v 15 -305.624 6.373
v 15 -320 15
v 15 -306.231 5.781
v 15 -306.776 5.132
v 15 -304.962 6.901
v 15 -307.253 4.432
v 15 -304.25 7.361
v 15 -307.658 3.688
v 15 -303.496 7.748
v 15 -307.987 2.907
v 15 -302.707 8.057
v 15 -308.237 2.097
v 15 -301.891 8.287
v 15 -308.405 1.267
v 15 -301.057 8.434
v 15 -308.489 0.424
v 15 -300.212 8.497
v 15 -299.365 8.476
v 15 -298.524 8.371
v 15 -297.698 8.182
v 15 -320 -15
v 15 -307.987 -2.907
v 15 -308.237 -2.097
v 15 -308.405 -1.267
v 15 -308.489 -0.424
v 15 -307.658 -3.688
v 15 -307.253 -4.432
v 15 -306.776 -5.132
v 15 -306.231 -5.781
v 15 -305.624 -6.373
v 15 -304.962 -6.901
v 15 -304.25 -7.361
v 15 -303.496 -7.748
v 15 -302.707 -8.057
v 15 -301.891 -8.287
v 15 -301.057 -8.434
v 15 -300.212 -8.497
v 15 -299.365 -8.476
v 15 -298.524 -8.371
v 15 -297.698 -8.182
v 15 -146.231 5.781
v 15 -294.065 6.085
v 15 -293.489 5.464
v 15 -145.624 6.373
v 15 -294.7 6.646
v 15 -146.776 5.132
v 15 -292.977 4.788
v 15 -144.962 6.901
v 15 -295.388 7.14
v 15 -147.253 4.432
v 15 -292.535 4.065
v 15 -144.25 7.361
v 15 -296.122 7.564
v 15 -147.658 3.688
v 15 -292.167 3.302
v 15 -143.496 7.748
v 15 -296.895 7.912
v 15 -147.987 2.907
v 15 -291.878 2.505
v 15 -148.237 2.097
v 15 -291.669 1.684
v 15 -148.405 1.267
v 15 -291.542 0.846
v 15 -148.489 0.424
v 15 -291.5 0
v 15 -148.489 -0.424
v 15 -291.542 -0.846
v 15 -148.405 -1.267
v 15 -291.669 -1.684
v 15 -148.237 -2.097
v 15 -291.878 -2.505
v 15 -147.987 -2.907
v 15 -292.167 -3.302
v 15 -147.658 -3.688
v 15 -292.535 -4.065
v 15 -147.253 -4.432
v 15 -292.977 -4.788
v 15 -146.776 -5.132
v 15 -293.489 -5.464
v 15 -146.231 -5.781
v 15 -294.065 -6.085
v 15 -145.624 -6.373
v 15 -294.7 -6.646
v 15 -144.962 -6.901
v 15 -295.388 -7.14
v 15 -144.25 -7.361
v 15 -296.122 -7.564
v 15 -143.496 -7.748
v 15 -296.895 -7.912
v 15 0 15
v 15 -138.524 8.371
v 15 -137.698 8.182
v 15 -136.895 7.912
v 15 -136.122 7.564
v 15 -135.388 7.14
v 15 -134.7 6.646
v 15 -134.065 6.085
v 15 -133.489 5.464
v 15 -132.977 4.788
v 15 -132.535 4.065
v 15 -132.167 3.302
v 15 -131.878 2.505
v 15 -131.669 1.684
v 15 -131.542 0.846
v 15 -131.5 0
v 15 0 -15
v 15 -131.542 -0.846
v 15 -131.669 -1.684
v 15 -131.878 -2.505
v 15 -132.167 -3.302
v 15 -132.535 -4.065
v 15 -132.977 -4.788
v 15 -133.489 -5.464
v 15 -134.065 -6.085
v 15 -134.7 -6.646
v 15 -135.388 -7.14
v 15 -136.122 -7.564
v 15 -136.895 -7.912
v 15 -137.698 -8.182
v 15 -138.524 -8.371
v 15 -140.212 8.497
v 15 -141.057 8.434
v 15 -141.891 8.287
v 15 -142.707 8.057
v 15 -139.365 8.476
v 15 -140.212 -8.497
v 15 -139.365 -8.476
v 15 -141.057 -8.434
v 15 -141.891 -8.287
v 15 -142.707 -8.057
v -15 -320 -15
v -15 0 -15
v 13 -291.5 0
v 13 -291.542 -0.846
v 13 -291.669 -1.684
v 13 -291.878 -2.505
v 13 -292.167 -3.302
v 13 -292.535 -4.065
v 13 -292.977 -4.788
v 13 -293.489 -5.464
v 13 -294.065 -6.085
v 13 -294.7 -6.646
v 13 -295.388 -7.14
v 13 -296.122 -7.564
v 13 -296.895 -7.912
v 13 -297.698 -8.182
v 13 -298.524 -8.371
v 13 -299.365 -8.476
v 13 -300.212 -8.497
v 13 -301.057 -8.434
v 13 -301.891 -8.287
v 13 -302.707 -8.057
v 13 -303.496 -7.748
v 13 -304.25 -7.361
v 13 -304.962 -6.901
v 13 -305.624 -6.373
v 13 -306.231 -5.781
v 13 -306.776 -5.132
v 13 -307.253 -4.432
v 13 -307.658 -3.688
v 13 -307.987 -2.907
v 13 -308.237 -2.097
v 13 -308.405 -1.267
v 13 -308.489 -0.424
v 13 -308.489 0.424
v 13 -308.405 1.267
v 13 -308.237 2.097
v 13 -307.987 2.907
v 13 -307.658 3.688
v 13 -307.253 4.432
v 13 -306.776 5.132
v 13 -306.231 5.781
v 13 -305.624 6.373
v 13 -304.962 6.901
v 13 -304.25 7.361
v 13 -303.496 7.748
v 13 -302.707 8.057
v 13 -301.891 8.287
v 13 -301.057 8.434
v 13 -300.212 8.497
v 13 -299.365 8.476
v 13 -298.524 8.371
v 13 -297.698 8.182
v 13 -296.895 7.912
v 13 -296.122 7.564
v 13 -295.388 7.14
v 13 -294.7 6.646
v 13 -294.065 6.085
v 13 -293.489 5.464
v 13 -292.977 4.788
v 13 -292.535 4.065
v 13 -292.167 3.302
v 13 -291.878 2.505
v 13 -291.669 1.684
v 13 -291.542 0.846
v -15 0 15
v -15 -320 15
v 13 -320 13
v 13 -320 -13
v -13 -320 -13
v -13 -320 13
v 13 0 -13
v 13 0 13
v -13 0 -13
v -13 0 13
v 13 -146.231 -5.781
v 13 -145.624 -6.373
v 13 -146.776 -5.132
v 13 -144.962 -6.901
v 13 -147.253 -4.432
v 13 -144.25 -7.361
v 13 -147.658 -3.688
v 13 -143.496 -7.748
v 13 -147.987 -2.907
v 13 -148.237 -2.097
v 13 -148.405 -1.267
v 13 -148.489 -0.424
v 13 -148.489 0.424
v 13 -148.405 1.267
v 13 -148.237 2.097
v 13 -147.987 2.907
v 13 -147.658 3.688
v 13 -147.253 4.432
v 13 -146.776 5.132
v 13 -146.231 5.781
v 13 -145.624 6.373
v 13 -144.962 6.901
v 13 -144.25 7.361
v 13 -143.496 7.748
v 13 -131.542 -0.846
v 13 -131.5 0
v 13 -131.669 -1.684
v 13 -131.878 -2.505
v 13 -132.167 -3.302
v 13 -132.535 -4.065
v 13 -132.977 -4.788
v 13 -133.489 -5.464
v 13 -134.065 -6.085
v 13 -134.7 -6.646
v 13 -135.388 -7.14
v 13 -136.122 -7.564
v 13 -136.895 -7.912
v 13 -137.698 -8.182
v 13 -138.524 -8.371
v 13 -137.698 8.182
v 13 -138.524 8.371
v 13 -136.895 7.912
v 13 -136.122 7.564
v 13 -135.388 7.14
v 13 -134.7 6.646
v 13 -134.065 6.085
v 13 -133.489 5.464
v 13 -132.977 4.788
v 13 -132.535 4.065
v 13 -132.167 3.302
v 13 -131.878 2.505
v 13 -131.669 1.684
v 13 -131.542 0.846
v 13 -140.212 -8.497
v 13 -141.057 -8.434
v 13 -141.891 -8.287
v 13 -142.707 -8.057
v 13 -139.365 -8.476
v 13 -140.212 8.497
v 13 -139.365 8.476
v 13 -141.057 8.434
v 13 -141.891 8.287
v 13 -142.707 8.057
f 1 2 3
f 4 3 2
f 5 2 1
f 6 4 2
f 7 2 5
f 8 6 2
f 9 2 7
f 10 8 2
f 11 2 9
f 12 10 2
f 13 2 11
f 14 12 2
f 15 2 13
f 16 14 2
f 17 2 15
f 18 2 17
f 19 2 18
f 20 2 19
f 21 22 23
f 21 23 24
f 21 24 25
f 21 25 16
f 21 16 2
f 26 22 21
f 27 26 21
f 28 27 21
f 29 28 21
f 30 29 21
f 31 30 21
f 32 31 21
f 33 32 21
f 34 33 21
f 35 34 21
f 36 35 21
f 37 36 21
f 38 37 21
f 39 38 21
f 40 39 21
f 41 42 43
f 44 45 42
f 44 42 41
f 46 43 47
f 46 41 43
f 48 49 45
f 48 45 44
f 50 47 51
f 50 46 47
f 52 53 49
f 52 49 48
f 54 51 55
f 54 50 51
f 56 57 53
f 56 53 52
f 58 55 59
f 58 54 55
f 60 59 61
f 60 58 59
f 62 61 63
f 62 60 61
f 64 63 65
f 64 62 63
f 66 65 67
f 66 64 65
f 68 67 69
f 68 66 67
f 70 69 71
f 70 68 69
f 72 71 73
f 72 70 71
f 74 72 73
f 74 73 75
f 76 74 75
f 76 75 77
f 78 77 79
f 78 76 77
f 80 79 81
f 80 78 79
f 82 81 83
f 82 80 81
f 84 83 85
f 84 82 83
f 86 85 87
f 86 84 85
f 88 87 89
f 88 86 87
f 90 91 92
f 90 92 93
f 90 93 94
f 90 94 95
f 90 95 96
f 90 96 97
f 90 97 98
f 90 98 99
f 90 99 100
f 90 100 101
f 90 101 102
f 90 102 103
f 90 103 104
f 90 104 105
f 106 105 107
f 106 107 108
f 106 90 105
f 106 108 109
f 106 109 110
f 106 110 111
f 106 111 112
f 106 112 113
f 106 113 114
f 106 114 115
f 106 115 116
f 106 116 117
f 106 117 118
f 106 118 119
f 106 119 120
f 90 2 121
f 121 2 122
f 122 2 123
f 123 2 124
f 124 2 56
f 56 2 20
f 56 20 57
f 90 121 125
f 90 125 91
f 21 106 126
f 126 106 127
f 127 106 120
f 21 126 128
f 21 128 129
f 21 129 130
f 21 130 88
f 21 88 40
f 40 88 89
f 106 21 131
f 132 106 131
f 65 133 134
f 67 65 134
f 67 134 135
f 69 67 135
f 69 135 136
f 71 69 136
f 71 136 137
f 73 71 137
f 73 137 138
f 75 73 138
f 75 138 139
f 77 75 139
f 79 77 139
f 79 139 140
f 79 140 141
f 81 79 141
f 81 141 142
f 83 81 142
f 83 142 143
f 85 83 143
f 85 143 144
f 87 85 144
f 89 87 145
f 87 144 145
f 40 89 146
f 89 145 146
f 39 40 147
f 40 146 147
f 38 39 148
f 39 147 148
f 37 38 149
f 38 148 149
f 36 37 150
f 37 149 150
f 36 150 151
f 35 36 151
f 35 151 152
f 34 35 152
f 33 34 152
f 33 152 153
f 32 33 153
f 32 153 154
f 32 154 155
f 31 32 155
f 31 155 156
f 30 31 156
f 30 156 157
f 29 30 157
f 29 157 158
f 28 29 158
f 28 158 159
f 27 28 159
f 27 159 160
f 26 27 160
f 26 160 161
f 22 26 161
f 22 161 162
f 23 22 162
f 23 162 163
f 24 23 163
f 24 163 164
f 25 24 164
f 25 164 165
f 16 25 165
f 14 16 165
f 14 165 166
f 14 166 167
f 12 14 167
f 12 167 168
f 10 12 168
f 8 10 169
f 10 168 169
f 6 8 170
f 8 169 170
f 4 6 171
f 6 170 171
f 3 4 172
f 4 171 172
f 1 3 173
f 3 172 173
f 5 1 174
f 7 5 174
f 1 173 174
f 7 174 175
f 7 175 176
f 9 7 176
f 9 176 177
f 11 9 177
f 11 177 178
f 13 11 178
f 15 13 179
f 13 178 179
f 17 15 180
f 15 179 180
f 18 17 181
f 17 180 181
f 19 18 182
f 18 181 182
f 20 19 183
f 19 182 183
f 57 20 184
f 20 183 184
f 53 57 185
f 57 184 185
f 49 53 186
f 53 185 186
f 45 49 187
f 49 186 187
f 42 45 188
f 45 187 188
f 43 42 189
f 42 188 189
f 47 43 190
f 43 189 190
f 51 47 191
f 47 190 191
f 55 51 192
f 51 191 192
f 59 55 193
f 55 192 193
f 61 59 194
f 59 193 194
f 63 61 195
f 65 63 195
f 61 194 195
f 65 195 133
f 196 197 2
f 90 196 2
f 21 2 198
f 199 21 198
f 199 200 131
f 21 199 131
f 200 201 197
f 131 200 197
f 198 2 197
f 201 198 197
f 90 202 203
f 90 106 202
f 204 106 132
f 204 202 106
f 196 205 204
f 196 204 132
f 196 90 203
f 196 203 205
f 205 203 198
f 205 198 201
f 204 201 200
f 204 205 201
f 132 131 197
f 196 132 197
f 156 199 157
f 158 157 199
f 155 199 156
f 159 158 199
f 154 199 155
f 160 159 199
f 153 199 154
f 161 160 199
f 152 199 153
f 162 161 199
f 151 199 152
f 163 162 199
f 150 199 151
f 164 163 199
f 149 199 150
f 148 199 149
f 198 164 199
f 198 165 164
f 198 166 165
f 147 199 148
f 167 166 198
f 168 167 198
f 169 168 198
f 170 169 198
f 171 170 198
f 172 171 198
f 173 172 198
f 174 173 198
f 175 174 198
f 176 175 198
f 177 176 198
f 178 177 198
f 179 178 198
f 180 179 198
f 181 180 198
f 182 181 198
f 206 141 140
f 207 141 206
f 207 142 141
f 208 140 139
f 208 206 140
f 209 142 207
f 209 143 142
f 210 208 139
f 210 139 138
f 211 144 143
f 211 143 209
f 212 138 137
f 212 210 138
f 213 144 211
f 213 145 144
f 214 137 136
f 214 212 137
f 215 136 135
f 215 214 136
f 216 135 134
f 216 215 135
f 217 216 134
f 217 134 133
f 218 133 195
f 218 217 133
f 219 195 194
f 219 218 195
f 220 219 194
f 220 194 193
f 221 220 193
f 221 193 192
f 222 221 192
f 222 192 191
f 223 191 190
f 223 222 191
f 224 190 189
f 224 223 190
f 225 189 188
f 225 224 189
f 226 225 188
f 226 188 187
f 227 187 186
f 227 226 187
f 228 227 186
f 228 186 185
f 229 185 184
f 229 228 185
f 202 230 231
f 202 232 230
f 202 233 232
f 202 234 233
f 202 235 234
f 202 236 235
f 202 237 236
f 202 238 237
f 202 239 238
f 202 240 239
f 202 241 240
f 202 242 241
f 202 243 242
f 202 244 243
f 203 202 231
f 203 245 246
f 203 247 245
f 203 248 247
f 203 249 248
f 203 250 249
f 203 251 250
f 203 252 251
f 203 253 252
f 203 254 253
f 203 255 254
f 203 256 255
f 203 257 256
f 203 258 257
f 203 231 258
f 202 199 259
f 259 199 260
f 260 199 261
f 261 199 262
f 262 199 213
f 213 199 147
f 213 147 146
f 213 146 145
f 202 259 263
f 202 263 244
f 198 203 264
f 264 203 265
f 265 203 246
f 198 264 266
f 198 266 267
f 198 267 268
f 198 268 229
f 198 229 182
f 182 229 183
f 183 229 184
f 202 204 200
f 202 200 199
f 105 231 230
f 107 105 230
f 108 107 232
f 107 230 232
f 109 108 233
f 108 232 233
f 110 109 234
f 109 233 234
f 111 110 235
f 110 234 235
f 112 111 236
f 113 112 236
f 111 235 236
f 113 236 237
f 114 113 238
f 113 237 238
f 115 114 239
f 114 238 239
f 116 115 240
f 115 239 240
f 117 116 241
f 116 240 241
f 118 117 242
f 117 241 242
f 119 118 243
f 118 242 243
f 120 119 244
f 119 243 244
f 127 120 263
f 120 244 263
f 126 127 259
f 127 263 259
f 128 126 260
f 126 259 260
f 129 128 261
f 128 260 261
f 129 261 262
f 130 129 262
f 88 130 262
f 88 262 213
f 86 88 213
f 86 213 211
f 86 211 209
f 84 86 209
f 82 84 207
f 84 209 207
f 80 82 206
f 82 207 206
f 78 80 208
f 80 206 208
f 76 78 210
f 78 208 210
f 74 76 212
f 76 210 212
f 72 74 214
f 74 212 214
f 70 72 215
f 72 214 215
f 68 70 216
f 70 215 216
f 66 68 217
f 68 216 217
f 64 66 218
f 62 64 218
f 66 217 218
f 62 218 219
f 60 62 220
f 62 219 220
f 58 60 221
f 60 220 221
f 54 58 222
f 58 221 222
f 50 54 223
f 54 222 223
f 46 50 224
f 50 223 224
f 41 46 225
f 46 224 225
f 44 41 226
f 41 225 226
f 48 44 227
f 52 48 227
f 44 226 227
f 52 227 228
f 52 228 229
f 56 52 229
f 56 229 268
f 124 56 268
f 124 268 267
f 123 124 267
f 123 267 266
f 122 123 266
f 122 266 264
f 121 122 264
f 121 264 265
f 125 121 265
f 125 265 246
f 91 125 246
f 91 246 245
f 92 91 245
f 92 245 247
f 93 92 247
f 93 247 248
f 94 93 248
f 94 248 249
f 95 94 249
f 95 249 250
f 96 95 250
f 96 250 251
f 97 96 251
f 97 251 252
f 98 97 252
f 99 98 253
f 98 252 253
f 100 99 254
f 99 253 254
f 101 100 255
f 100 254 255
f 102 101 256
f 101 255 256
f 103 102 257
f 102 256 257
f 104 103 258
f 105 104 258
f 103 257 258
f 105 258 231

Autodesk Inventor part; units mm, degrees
ref_plane "YZ Plane" through (0, 0, 0) normal (1, 0, 0) x (0, 1, 0)
ref_plane "XZ Plane" through (0, 0, 0) normal (0, 1, 0) x (-1, 0, 0)
ref_plane "XY Plane" through (0, 0, 0) normal (0, 0, 1) x (1, 0, 0)
sketch "Sketch9" plane through (0, 0, 0) normal (0, 1, 0) x (-1, 0, 0)
  line L0 (15, 15) -> (-15, 15)
  line L1 (-15, 15) -> (-15, -15)
  line L2 (-15, -15) -> (15, -15)
  line L3 (15, -15) -> (15, 15)
  line L4 (15, 15) -> (-15, -15) construction
  line L5 (-15, 15) -> (15, -15) construction
  line L6 (-13, 13) -> (13, 13)
  line L7 (13, 13) -> (13, -13)
  line L8 (13, -13) -> (-13, -13)
  line L9 (-13, -13) -> (-13, 13)
  point P0 (0, 0)
  dimension "d172" = 30
  dimension "d173" = 30
  dimension "d174" = 2
extrude "Extrusion3" add sketch "Sketch9" against normal blind 320
sketch "Sketch10" plane through (0, 0, 0) normal (1, 0, 0) x (0, 1, 0)
  line L0 (0, 15) -> (0, -15) construction
  line L1 (0, 15) -> (-320, 15) construction
  line L2 (-320, -15) -> (-320, 15) construction
  line L3 (0, -15) -> (-320, -15) construction
  line L4 (-148.5, 8.5) -> (-131.5, 8.5)
  line L5 (-131.5, 8.5) -> (-131.5, -8.5)
  line L6 (-131.5, -8.5) -> (-148.5, -8.5)
  line L7 (-148.5, -8.5) -> (-148.5, 8.5)
  line L8 (-148.5, 8.5) -> (-131.5, -8.5) construction
  line L9 (-131.5, 8.5) -> (-148.5, -8.5) construction
  line L10 (-308.5, 8.5) -> (-291.5, 8.5)
  line L11 (-291.5, 8.5) -> (-291.5, -8.5)
  line L12 (-291.5, -8.5) -> (-308.5, -8.5)
  line L13 (-308.5, -8.5) -> (-308.5, 8.5)
  line L14 (-308.5, 8.5) -> (-291.5, -8.5) construction
  line L15 (-291.5, 8.5) -> (-308.5, -8.5) construction
  line L16 (-428.5, 8.5) -> (-411.5, 8.5)
  line L17 (-411.5, 8.5) -> (-411.5, -8.5)
  line L18 (-411.5, -8.5) -> (-428.5, -8.5)
  line L19 (-428.5, -8.5) -> (-428.5, 8.5)
  line L20 (-428.5, 8.5) -> (-411.5, -8.5) construction
  line L21 (-411.5, 8.5) -> (-428.5, -8.5) construction
  circle A0 centre (-470, 0) radius 8.5
  line L22 (0, 0) -> (30, 0)
  circle A1 centre (-140, 0) radius 8.5
  circle A2 centre (-300, 0) radius 8.5
  circle A3 centre (-420, 0) radius 8.5
  dimension "d177" = 17
  dimension "d178" = 17
  dimension "d181" = 30
  dimension "d182" = 170
  dimension "d183" = 330
  dimension "d184" = 450
  dimension "d185" = 500
  dimension "d186" = 17
extrude "Extrusion4" cut sketch "Sketch10" along normal through all contours A1 | A2
properties part number "PNS 756 FDS 1200 way tube 3_1600" material "Stainless Steel"
